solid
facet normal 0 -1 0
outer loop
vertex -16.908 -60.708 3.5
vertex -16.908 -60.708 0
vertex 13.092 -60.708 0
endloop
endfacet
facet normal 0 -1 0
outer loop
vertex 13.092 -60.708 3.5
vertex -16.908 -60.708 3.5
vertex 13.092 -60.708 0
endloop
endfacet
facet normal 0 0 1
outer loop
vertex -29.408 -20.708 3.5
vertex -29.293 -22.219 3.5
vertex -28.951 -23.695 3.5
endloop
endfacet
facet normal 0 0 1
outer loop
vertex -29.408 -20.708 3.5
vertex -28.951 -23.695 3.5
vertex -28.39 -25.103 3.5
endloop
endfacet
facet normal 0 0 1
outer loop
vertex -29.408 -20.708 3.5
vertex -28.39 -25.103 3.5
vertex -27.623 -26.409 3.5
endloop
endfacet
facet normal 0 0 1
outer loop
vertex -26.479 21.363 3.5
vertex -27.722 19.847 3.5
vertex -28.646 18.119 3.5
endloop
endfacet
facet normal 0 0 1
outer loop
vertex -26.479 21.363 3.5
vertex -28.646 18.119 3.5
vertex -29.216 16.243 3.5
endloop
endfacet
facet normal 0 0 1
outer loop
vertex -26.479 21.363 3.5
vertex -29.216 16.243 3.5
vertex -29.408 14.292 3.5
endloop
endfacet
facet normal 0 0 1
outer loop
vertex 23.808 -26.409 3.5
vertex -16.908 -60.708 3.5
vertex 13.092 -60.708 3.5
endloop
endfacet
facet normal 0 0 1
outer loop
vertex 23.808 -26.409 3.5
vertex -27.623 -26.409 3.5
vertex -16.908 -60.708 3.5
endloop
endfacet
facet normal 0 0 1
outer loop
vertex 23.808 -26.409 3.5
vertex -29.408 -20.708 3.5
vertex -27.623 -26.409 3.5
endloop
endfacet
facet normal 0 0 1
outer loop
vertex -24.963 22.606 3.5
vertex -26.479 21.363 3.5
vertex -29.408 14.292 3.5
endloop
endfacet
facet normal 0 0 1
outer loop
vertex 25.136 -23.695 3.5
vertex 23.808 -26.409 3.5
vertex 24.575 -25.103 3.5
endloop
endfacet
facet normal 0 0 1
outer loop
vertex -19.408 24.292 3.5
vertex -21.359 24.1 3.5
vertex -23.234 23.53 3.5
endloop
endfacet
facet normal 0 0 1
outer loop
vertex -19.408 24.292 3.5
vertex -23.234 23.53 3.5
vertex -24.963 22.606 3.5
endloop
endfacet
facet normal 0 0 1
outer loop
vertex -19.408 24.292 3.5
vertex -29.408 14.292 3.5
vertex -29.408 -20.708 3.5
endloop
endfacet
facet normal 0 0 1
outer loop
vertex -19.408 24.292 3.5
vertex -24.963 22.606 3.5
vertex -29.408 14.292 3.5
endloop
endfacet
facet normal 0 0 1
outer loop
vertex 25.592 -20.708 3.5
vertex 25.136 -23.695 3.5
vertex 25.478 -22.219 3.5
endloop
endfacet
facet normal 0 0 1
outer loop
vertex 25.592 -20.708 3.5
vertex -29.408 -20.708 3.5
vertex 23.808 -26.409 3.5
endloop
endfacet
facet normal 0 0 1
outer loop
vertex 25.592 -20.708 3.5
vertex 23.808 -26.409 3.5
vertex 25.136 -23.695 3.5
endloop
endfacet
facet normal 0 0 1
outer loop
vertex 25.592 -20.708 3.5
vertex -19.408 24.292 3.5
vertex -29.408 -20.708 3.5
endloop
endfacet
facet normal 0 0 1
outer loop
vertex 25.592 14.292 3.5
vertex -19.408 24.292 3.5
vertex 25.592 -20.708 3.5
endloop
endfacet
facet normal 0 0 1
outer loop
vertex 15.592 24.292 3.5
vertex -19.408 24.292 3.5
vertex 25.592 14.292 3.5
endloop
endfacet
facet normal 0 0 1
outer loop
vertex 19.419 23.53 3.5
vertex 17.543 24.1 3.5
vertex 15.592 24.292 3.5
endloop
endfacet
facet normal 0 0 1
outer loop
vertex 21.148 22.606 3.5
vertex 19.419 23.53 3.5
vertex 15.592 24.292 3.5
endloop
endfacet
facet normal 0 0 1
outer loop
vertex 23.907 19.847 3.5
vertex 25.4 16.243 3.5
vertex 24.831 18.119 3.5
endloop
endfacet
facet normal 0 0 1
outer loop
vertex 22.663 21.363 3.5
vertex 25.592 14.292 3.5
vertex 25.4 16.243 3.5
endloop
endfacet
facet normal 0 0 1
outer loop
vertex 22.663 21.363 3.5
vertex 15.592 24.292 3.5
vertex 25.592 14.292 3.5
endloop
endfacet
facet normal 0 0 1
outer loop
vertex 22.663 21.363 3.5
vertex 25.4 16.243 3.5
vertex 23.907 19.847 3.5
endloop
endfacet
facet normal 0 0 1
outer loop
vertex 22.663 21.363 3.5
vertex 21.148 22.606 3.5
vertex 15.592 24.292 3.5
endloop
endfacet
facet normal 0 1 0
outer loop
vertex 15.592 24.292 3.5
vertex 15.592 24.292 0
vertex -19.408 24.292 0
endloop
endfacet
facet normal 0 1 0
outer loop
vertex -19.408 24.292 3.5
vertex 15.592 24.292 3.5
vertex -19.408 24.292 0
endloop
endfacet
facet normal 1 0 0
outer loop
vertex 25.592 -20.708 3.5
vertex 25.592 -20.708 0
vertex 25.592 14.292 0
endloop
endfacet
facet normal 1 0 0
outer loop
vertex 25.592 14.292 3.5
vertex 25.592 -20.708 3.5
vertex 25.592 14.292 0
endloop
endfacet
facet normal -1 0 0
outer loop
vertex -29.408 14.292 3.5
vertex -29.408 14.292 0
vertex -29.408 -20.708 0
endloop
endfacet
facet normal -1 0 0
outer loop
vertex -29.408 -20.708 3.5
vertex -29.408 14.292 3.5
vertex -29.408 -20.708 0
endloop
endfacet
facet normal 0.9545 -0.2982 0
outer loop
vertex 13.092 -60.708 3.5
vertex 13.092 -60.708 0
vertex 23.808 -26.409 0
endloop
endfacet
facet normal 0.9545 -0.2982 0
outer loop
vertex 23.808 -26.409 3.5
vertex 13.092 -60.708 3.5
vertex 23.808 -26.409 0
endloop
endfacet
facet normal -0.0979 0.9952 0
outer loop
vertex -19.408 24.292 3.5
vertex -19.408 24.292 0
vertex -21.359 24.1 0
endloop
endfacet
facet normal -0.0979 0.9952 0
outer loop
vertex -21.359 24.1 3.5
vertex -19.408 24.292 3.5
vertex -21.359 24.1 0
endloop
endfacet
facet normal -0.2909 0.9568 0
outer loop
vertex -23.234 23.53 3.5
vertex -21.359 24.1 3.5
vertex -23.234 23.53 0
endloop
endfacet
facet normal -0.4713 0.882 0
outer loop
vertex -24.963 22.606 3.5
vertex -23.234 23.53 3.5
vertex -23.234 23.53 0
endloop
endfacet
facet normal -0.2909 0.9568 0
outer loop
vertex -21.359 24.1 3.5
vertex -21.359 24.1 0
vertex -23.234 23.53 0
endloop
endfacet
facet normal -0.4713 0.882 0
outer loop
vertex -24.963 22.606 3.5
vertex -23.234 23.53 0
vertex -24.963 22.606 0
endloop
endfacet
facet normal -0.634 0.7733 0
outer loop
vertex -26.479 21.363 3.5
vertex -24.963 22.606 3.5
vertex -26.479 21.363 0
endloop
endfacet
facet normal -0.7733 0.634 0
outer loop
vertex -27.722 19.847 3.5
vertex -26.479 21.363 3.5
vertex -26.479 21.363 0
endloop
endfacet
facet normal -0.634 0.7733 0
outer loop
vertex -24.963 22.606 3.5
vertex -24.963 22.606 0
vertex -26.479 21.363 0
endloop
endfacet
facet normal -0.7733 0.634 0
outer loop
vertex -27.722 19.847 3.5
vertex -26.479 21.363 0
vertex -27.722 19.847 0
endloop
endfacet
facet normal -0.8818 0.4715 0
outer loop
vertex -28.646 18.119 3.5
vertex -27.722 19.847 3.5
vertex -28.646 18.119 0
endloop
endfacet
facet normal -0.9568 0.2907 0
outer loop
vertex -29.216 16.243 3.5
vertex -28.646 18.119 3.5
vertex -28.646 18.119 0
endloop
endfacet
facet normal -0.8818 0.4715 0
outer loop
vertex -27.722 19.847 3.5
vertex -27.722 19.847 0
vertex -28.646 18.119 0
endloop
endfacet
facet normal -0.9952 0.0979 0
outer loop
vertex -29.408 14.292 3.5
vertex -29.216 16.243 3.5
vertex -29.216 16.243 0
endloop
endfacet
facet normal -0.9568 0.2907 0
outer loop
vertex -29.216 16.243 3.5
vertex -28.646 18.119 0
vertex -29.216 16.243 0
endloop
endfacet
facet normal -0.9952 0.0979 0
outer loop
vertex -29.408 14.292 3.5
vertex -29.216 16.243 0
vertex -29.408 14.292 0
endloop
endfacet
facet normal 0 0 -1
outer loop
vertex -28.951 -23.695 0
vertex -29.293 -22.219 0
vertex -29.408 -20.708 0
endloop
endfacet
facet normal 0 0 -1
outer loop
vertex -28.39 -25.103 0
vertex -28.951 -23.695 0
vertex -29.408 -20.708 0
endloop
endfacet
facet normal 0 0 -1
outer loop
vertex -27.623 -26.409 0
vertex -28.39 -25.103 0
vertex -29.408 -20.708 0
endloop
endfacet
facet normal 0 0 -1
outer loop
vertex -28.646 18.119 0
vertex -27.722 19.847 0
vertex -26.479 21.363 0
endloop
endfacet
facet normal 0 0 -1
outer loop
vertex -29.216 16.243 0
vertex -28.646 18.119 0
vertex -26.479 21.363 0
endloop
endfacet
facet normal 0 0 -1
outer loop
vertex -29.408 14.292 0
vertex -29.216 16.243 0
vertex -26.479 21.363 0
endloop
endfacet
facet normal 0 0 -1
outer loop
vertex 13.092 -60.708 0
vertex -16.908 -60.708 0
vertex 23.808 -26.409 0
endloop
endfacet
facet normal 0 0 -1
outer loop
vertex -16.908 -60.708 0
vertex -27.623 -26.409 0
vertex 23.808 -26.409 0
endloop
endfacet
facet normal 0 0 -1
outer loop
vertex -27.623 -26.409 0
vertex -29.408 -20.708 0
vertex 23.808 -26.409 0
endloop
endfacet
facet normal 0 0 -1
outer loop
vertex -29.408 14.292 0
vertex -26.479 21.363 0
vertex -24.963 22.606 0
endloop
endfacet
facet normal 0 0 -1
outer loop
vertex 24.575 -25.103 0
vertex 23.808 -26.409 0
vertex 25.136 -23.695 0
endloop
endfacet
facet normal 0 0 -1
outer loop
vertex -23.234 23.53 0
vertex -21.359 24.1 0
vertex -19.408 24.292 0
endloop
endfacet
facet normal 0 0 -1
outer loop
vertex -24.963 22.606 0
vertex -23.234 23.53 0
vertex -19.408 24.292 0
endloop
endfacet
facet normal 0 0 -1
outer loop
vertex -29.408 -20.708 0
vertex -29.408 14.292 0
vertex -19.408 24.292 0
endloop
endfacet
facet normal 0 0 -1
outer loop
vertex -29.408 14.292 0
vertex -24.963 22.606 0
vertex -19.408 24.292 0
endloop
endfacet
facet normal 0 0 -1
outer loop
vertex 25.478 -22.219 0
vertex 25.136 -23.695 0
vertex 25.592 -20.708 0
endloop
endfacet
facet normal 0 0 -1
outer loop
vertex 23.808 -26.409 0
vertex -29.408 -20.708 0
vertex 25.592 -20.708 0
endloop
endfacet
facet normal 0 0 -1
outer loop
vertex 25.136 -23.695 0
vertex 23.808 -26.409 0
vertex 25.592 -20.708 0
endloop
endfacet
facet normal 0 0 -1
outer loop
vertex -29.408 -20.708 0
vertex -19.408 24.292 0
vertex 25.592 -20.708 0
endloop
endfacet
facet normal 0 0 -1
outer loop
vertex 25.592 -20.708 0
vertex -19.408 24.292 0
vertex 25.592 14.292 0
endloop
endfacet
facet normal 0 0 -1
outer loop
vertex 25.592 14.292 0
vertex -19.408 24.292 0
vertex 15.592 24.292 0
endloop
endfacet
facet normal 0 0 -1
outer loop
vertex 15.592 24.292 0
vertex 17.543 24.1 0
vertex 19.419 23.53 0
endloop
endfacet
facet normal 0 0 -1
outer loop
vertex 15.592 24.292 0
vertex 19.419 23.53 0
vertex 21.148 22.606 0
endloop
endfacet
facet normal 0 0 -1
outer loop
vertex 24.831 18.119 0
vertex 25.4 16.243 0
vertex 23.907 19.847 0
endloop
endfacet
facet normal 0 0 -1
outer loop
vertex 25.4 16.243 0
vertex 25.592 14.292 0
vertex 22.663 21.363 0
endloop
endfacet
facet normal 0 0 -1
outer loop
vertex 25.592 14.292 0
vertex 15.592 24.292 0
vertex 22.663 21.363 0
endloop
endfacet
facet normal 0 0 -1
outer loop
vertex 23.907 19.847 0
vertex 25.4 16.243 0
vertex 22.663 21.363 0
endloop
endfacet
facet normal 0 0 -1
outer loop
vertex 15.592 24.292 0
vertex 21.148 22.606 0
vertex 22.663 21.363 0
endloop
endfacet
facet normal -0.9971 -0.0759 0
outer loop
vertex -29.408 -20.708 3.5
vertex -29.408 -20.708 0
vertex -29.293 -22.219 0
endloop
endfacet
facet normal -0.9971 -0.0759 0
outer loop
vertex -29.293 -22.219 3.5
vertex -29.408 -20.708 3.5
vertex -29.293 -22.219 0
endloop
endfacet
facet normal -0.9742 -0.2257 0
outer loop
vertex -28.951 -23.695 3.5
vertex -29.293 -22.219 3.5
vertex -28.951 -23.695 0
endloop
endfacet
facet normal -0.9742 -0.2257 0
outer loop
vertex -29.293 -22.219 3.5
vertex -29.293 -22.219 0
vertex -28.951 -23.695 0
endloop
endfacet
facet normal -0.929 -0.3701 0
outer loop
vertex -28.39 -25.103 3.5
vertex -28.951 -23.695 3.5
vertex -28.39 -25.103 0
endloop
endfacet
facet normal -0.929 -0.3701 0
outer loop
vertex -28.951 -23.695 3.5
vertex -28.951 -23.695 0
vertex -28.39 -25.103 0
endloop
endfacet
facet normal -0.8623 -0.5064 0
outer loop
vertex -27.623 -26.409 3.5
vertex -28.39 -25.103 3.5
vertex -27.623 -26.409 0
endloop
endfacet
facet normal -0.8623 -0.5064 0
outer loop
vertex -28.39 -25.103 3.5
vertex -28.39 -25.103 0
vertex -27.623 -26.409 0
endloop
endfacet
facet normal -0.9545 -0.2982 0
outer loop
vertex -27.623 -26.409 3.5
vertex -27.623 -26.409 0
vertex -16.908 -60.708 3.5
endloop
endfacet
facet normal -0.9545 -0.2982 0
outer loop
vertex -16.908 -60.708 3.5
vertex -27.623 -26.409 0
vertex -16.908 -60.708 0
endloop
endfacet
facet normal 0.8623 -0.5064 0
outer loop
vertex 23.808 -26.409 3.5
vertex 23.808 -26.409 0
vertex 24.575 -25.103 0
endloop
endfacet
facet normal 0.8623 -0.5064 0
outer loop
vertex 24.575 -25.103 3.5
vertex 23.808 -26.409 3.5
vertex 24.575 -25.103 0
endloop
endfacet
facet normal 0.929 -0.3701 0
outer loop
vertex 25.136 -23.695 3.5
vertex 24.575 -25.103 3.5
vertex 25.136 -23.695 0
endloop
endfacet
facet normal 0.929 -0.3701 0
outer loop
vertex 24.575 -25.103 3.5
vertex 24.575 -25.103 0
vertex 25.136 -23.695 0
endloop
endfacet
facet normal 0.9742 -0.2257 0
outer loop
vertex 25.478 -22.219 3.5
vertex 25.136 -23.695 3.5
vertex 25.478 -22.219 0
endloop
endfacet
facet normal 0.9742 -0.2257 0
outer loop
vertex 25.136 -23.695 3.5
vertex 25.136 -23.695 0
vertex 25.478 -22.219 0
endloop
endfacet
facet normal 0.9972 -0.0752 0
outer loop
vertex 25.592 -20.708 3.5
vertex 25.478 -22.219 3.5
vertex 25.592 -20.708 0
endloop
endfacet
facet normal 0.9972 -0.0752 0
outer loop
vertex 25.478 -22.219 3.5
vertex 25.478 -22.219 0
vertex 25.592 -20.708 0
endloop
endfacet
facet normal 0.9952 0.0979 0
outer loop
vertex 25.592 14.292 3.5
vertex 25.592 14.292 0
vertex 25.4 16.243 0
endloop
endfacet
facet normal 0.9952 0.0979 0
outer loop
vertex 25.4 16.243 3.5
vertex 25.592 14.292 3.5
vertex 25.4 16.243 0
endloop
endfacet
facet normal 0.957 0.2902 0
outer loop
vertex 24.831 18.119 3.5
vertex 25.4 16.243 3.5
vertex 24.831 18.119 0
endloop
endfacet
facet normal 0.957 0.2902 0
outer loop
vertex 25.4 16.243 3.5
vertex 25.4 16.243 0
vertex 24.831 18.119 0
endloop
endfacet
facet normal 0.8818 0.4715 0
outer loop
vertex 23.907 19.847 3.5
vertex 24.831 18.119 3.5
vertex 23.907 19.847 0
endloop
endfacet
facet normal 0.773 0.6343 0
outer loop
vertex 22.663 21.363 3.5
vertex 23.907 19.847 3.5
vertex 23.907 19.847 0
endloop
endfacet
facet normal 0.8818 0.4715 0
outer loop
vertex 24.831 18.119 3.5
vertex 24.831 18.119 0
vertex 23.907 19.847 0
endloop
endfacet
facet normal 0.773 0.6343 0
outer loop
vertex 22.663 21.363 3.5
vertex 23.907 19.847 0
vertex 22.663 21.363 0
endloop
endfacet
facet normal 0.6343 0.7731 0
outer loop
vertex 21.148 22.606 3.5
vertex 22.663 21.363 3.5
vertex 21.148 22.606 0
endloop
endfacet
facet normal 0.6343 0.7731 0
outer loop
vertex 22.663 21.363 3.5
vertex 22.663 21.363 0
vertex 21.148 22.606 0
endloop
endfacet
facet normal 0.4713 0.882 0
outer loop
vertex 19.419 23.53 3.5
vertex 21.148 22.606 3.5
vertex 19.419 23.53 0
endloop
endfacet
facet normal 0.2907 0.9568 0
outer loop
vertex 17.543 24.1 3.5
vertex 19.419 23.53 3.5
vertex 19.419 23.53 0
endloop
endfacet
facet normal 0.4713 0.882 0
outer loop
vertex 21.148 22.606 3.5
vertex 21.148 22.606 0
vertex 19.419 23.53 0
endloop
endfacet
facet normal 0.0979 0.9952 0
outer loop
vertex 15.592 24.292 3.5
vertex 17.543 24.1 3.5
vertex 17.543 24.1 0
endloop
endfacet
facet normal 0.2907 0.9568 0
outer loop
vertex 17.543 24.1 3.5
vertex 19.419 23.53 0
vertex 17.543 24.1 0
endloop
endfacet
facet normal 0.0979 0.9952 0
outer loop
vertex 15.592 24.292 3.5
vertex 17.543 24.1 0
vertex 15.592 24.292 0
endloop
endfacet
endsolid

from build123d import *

# Parameters (mm, degrees)
SALIENTE_EXTRUIR1_DEPTH = 3.5


with BuildPart() as part:
    # Croquis1 → Saliente-Extruir1 (new body)
    with BuildSketch(Plane.XY):
        with BuildLine():
            Line((-16.907663566, -60.708333333), (13.092336434, -60.708333333))
            Line((13.092336434, -60.708333333), (23.808162125, -26.40922872))
            ThreePointArc((23.808162125, -26.40922872), (25.135875005, -23.695116141), (25.592336434, -20.708333333))
            Line((25.592336434, -20.708333333), (25.592336434, 14.291666667))
            ThreePointArc((25.592336434, 14.291666667), (22.663404246, 21.362734479), (15.592336434, 24.291666667))
            Line((15.592336434, 24.291666667), (-19.407663566, 24.291666667))
            ThreePointArc((-19.407663566, 24.291666667), (-26.478731378, 21.362734479), (-29.407663566, 14.291666667))
            Line((-29.407663566, 14.291666667), (-29.407663566, -20.708333333))
            ThreePointArc((-29.407663566, -20.708333333), (-28.951202137, -23.695116141), (-27.623489258, -26.40922872))
            Line((-27.623489258, -26.40922872), (-16.907663566, -60.708333333))
        make_face()
    extrude(amount=SALIENTE_EXTRUIR1_DEPTH)


solid = part.part
